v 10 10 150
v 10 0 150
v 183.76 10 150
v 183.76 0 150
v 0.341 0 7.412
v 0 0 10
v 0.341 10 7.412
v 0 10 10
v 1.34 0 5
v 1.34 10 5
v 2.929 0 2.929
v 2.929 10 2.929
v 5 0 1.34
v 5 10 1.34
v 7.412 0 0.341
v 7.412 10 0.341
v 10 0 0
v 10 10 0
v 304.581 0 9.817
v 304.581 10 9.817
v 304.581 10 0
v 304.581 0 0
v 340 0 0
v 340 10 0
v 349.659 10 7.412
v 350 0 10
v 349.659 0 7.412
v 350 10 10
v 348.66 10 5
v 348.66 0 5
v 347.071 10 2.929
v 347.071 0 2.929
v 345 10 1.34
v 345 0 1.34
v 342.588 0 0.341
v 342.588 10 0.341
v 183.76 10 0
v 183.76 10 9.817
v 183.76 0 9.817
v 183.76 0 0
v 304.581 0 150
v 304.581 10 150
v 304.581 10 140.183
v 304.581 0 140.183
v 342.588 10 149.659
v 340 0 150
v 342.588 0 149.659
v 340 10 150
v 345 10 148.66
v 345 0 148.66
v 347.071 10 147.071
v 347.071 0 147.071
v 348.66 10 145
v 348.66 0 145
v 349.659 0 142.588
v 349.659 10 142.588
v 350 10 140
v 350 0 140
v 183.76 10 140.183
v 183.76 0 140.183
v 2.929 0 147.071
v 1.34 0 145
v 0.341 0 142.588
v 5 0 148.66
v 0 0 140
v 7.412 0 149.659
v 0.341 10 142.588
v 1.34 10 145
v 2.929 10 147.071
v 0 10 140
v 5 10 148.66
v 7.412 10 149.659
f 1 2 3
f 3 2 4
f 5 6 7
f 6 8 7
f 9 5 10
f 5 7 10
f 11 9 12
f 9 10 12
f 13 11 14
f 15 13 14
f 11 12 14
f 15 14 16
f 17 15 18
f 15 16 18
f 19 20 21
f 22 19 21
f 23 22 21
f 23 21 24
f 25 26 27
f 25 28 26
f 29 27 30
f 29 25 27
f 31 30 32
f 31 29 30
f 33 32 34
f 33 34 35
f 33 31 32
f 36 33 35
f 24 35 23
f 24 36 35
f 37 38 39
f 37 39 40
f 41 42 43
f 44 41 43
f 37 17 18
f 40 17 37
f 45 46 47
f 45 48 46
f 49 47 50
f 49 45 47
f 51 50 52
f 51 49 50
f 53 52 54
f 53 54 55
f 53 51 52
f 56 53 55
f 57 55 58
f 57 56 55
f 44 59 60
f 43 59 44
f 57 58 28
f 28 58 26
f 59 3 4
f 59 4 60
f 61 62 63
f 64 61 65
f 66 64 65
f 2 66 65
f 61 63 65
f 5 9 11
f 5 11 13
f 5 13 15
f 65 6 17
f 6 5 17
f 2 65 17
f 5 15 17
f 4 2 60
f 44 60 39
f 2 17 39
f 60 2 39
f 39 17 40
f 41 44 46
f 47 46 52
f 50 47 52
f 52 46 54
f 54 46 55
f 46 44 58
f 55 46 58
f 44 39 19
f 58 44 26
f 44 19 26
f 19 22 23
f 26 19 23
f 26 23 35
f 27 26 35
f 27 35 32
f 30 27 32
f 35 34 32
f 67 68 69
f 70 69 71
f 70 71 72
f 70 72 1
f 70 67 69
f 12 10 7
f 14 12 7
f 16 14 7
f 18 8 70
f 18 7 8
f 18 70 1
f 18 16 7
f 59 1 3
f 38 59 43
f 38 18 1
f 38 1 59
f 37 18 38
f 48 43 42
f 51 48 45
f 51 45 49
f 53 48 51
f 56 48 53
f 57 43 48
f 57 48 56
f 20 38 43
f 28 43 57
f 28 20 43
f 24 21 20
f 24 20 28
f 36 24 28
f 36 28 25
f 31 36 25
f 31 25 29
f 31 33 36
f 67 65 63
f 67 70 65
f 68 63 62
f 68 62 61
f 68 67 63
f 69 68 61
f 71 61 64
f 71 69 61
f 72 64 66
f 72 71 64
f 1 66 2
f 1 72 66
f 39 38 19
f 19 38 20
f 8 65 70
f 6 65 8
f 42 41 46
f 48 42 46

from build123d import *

# Parameters (mm, degrees)
SKETCH1_W           = 350
SKETCH1_H           = 150
BOSS_EXTRUDE1_DEPTH = 10
FILLET2_R           = 10
SKETCH9_W           = 120.821087965
SKETCH9_H           = 9.816766212
CUT_EXTRUDE6_DEPTH  = 25


with BuildPart() as part:
    # Sketch1 → Boss-Extrude1 (new body)
    with BuildSketch(Plane(origin=(0, 0, 0), x_dir=(1, 0, 0), z_dir=(0, 1, 0))):
        with Locations((175, -75)):
            Rectangle(SKETCH1_W, SKETCH1_H)
    extrude(amount=BOSS_EXTRUDE1_DEPTH)

    # Fillet2
    fillet2_edges = [part.edges().sort_by_distance(p)[0] for p in [
        (0, 5, 0),
        (350, 5, 0),
        (350, 5, 150),
        (0, 5, 150),
    ]]
    fillet(fillet2_edges, radius=FILLET2_R)

    # Sketch9 → Cut-Extrude6 (cut)
    with BuildSketch(Plane(origin=(0, 10, 0), x_dir=(1, 0, 0), z_dir=(0, 1, 0))):
        with Locations((244.170878002, -145.091616894)):
            Rectangle(SKETCH9_W, SKETCH9_H)
        with Locations((244.170878002, -4.908383106)):
            Rectangle(SKETCH9_W, SKETCH9_H)
    extrude(amount=-CUT_EXTRUDE6_DEPTH, mode=Mode.SUBTRACT)


solid = part.part
